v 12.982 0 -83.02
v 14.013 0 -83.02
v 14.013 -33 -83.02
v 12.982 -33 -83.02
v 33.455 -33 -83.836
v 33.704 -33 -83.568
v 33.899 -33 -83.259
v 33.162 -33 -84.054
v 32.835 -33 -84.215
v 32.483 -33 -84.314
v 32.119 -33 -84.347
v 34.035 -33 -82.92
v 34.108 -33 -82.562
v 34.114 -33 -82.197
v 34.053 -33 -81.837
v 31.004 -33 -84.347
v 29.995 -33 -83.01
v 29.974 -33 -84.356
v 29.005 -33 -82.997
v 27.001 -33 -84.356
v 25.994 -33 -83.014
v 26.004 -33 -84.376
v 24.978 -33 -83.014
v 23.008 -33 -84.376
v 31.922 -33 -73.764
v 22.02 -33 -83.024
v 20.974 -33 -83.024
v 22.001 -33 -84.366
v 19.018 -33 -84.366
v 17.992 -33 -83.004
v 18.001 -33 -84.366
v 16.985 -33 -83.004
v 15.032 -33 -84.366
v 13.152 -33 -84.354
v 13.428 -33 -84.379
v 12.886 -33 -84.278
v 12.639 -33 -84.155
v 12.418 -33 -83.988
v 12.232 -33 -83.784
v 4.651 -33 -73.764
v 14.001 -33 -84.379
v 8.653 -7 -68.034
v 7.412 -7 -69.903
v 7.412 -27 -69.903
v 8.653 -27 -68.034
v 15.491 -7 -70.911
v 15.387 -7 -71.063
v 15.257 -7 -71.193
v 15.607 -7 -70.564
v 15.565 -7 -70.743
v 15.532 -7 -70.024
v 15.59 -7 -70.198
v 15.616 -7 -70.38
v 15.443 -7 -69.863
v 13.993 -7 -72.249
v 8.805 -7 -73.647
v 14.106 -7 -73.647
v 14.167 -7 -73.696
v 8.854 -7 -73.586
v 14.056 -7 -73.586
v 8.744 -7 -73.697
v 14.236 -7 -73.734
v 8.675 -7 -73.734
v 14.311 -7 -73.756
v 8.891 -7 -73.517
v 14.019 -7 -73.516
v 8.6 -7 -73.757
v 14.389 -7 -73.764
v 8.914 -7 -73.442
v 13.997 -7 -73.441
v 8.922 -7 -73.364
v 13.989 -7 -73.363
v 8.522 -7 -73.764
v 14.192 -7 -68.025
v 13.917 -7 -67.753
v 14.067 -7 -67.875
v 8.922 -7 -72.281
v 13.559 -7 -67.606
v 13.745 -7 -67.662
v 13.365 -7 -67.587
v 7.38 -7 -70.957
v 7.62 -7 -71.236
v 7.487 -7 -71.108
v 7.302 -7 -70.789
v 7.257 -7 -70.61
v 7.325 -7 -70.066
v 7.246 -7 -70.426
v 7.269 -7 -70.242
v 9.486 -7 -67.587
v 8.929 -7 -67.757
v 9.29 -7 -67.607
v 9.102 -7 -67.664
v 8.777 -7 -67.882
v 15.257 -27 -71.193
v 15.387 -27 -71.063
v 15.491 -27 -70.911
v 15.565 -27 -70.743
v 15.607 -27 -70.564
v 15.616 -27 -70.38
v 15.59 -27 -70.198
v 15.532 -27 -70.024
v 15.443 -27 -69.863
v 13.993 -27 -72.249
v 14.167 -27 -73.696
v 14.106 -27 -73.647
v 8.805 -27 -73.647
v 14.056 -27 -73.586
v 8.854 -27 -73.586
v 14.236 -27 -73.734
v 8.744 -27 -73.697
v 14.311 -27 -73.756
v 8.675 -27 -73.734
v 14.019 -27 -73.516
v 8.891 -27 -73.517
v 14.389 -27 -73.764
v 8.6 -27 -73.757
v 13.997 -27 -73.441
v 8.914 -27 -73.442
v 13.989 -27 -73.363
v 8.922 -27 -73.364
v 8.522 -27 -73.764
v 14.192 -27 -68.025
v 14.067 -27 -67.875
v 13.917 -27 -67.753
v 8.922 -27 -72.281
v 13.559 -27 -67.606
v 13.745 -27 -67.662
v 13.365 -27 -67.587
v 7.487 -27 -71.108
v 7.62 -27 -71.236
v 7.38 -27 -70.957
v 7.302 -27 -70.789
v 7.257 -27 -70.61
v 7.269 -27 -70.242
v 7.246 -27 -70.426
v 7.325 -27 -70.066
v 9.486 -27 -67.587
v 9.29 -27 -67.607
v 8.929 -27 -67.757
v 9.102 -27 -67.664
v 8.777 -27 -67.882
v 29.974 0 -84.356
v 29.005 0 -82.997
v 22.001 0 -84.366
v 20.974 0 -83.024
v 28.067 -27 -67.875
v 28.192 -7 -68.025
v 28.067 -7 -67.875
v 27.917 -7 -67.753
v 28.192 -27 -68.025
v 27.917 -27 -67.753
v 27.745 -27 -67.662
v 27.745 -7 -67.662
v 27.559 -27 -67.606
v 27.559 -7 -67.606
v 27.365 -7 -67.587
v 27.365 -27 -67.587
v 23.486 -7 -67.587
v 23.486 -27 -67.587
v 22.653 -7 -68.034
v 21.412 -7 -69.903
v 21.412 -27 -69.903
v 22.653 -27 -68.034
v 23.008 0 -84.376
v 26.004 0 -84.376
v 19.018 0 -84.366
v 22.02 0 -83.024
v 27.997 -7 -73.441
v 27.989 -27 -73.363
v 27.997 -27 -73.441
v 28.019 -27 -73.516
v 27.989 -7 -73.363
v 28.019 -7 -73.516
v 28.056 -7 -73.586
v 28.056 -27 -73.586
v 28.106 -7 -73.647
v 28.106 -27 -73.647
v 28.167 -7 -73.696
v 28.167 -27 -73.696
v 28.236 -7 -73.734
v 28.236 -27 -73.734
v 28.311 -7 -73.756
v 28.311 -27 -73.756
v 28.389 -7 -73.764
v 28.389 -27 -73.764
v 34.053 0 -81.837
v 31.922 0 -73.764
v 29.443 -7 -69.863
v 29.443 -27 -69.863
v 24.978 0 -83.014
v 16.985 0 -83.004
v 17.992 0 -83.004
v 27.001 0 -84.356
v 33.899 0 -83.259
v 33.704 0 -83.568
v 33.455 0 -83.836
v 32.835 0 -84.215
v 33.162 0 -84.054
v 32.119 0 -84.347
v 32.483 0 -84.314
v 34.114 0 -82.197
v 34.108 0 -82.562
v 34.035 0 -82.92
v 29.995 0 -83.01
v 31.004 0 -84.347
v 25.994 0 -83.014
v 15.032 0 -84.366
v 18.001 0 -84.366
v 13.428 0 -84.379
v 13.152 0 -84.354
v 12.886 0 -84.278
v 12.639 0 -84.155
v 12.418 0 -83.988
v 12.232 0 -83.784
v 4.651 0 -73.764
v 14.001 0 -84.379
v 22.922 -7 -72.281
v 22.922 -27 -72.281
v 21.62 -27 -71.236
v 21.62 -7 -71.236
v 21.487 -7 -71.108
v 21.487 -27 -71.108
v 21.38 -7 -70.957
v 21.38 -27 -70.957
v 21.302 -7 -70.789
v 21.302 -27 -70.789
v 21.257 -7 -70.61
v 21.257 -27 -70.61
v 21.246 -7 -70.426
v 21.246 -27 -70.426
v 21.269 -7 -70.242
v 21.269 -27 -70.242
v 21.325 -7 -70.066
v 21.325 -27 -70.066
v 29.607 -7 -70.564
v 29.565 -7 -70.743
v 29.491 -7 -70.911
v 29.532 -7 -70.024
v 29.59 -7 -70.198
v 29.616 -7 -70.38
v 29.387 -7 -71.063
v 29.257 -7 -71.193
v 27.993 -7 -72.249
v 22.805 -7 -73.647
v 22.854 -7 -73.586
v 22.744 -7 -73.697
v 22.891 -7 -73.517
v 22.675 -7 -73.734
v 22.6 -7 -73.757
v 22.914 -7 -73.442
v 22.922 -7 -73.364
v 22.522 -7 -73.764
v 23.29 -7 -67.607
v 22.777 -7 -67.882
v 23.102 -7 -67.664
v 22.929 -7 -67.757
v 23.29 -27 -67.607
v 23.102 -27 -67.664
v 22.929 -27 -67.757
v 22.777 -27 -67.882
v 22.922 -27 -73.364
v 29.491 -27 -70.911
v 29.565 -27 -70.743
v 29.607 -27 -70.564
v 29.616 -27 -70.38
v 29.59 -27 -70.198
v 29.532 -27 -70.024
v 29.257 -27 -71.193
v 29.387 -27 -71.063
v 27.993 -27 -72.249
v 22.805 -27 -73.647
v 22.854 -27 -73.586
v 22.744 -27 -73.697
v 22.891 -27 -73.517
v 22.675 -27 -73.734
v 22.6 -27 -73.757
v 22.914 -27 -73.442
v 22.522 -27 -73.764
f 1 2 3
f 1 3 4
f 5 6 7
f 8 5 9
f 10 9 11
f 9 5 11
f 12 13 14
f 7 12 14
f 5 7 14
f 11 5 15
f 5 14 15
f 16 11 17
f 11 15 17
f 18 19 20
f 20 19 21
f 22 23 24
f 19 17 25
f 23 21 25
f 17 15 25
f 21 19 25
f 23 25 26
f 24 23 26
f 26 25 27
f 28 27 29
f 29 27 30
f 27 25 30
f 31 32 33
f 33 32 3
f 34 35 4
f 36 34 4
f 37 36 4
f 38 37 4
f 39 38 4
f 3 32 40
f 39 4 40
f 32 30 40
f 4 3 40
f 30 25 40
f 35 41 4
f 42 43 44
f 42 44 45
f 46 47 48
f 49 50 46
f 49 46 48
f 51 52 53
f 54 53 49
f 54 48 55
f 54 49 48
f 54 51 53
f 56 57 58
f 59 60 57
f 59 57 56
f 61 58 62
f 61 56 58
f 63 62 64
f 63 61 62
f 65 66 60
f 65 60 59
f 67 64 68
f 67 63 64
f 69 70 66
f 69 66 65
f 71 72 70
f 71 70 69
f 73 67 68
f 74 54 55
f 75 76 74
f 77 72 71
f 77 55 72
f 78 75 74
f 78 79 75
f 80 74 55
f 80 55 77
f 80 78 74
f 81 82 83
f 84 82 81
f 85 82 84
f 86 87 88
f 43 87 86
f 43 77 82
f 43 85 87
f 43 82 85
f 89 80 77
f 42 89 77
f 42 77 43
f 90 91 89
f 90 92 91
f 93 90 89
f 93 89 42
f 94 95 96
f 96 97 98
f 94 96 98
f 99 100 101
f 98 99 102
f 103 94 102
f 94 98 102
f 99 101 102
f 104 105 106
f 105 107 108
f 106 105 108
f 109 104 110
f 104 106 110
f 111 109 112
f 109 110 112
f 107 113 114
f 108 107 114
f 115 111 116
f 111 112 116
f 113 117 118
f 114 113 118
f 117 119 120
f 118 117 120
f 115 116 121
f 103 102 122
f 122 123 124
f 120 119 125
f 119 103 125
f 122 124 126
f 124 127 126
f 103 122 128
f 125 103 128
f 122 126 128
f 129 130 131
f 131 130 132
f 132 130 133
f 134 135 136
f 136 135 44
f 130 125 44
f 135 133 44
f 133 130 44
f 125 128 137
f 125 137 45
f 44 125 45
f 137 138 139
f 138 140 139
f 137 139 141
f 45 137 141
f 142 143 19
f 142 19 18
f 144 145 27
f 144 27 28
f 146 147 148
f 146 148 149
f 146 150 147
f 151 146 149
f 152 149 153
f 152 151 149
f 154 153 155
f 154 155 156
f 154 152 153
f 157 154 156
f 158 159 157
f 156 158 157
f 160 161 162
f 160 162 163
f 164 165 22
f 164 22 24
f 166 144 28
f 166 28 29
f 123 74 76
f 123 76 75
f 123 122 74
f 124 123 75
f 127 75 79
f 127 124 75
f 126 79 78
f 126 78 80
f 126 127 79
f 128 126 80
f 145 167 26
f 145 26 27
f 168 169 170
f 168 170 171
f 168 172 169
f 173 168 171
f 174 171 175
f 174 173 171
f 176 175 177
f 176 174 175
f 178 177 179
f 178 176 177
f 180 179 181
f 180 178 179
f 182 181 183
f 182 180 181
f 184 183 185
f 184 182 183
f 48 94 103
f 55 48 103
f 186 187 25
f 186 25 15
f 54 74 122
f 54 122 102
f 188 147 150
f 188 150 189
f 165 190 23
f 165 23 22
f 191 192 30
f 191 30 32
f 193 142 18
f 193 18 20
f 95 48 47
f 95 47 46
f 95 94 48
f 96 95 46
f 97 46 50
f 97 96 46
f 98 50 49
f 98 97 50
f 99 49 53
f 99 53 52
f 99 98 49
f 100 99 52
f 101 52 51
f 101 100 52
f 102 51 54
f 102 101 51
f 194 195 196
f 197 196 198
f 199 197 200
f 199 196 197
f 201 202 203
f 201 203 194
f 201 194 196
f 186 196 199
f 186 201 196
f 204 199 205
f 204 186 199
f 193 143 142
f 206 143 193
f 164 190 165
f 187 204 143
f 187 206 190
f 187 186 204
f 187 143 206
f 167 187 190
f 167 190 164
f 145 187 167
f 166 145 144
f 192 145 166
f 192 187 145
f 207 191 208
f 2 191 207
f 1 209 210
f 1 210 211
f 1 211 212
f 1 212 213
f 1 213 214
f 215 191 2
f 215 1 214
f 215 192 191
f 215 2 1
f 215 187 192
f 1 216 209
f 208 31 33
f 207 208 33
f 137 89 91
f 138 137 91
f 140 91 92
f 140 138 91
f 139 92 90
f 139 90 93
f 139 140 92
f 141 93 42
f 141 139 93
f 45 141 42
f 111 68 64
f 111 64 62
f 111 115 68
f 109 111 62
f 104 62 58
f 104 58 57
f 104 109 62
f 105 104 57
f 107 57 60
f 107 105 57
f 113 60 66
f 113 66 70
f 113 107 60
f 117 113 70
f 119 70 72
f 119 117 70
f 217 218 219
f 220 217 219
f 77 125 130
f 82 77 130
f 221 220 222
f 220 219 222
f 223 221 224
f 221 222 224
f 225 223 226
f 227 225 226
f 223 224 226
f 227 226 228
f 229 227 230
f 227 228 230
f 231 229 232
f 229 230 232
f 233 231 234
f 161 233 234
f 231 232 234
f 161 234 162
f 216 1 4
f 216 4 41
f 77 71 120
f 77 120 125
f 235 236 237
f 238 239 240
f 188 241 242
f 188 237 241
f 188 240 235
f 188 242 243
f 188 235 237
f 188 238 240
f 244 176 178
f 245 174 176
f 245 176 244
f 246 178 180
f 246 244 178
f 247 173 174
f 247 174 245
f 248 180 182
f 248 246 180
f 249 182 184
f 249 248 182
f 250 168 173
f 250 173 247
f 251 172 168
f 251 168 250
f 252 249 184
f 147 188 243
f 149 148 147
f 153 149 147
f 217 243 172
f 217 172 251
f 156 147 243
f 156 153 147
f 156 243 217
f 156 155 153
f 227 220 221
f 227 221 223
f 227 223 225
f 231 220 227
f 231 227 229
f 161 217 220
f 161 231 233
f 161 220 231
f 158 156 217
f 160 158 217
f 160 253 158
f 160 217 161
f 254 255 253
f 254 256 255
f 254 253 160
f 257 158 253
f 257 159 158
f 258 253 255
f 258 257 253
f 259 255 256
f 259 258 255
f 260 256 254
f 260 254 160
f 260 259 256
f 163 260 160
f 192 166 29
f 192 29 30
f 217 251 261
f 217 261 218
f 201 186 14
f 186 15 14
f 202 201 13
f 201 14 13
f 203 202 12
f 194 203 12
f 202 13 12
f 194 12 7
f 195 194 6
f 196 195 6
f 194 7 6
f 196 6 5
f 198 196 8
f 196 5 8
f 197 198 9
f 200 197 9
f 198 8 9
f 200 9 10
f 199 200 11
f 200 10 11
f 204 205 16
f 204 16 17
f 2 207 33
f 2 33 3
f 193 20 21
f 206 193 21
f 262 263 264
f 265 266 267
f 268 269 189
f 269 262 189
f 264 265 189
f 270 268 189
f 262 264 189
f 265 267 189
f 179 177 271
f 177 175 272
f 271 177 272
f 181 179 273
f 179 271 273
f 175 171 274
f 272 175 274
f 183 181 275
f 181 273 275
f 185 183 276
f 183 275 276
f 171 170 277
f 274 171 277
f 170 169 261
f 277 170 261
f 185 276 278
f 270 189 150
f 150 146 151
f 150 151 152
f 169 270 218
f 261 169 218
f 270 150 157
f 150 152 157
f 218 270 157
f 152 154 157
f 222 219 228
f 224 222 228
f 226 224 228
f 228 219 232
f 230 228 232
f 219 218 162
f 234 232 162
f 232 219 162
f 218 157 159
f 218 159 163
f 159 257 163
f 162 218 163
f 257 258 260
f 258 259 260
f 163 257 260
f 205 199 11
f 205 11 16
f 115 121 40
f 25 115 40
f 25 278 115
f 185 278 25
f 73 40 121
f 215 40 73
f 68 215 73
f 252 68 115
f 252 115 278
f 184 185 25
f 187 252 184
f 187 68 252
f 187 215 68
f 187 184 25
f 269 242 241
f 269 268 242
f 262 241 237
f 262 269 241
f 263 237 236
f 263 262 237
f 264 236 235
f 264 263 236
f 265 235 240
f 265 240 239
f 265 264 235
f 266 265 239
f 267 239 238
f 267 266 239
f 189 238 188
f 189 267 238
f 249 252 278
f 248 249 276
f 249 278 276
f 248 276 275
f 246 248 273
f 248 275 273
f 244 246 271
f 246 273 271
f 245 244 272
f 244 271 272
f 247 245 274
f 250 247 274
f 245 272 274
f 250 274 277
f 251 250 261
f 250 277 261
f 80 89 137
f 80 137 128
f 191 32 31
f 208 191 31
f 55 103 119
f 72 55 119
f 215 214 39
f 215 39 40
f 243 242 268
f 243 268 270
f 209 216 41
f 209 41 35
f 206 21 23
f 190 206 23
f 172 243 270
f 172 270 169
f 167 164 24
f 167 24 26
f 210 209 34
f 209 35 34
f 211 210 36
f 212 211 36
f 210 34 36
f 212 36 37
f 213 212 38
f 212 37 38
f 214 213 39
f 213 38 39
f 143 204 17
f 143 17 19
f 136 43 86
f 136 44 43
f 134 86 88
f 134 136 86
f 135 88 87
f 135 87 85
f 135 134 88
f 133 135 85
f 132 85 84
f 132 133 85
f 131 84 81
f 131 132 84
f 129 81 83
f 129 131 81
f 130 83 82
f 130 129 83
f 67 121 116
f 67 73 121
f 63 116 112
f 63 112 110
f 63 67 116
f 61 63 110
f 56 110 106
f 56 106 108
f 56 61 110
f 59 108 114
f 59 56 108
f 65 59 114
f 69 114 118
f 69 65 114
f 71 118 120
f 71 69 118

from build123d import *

# Parameters (mm, degrees)
PAD017_DEPTH = 20
PAD015_DEPTH = 33
PAD016_DEPTH = 20
FILLET010_R  = 1
FILLET011_R  = 0.4
FILLET012_R  = 1.5
FILLET013_R  = 2


with BuildPart() as pad017:
    # Sketch021 → Pad017 (new body)
    with BuildSketch(Plane(origin=(10, -7, 0.4), x_dir=(1, 0, 0), z_dir=(0, -1, 0))):
        Polygon((12.921668, -76.043343), (12.921668, -72.681298), (10.907037, -71.064545), (12.949577, -67.987406), (17.894252, -67.987406), (19.953335, -71.012405), (17.993304, -72.648705), (17.981073, -76.043343), align=None)
    extrude(amount=PAD017_DEPTH)


with BuildPart() as pad015:
    # Sketch019 → Pad015 (new body)
    with BuildSketch(Plane.XZ):
        Polygon((31.922119, -73.764191), (34.715668, -84.347412), (31.00419, -84.347412), (29.994871, -83.010223), (29.004835, -82.997353), (29.97435, -84.356453), (27.001257, -84.356453), (25.99424, -83.013763), (24.977634, -83.013763), (26.003832, -84.375633), (23.007538, -84.375633), (22.019703, -83.023636), (20.974325, -83.023636), (22.000523, -84.366325), (19.017838, -84.366325), (17.99164, -83.004456), (16.984625, -83.004456), (18.00123, -84.366325), (15.032244, -84.366325), (14.013124, -83.020378), (12.982291, -83.020378), (14.00141, -84.379204), (12.681671, -84.379204), (4.650895, -73.764191), align=None)
    extrude(amount=PAD015_DEPTH)


with BuildPart() as fillet013:
    # Sketch020 → Pad016 (new body)
    with BuildSketch(Plane(origin=(-4, -7, 0.4), x_dir=(1, 0, 0), z_dir=(0, -1, 0))):
        Polygon((12.921668, -76.043343), (12.921668, -72.681298), (10.907037, -71.064545), (12.949577, -67.987406), (17.894252, -67.987406), (19.953335, -71.012405), (17.993304, -72.648705), (17.981073, -76.043343), align=None)
    extrude(amount=PAD016_DEPTH)

    # Fusion002: union Pad015
    add(pad015.part)

    # Fusion003: union Pad017
    add(pad017.part)

    # Fillet010
    fillet010_edges = [fillet013.edges().sort_by_distance(p)[0] for p in [
        (20.907037, -17, -70.664545),
        (22.949577, -17, -67.587406),
        (27.894252, -17, -67.587406),
        (29.953335, -17, -70.612405),
        (15.953335, -17, -70.612405),
        (13.894252, -17, -67.587406),
        (8.949577, -17, -67.587406),
        (6.907037, -17, -70.664545),
    ]]
    fillet(fillet010_edges, radius=FILLET010_R)

    # Fillet011
    fillet011_edges = [fillet013.edges().sort_by_distance(p)[0] for p in [
        (22.921668, -17, -73.764191),
        (27.987844, -17, -73.764191),
        (8.921668, -17, -73.764191),
        (13.987844, -17, -73.764191),
    ]]
    fillet(fillet011_edges, radius=FILLET011_R)

    # Fillet012
    fillet012_edges = [fillet013.edges().sort_by_distance(p)[0] for p in [
        (12.681671, -16.5, -84.379204),
    ]]
    fillet(fillet012_edges, radius=FILLET012_R)

    # Fillet013
    fillet013_edges = [fillet013.edges().sort_by_distance(p)[0] for p in [
        (34.715668, -16.5, -84.347412),
    ]]
    fillet(fillet013_edges, radius=FILLET013_R)


solid = fillet013.part
